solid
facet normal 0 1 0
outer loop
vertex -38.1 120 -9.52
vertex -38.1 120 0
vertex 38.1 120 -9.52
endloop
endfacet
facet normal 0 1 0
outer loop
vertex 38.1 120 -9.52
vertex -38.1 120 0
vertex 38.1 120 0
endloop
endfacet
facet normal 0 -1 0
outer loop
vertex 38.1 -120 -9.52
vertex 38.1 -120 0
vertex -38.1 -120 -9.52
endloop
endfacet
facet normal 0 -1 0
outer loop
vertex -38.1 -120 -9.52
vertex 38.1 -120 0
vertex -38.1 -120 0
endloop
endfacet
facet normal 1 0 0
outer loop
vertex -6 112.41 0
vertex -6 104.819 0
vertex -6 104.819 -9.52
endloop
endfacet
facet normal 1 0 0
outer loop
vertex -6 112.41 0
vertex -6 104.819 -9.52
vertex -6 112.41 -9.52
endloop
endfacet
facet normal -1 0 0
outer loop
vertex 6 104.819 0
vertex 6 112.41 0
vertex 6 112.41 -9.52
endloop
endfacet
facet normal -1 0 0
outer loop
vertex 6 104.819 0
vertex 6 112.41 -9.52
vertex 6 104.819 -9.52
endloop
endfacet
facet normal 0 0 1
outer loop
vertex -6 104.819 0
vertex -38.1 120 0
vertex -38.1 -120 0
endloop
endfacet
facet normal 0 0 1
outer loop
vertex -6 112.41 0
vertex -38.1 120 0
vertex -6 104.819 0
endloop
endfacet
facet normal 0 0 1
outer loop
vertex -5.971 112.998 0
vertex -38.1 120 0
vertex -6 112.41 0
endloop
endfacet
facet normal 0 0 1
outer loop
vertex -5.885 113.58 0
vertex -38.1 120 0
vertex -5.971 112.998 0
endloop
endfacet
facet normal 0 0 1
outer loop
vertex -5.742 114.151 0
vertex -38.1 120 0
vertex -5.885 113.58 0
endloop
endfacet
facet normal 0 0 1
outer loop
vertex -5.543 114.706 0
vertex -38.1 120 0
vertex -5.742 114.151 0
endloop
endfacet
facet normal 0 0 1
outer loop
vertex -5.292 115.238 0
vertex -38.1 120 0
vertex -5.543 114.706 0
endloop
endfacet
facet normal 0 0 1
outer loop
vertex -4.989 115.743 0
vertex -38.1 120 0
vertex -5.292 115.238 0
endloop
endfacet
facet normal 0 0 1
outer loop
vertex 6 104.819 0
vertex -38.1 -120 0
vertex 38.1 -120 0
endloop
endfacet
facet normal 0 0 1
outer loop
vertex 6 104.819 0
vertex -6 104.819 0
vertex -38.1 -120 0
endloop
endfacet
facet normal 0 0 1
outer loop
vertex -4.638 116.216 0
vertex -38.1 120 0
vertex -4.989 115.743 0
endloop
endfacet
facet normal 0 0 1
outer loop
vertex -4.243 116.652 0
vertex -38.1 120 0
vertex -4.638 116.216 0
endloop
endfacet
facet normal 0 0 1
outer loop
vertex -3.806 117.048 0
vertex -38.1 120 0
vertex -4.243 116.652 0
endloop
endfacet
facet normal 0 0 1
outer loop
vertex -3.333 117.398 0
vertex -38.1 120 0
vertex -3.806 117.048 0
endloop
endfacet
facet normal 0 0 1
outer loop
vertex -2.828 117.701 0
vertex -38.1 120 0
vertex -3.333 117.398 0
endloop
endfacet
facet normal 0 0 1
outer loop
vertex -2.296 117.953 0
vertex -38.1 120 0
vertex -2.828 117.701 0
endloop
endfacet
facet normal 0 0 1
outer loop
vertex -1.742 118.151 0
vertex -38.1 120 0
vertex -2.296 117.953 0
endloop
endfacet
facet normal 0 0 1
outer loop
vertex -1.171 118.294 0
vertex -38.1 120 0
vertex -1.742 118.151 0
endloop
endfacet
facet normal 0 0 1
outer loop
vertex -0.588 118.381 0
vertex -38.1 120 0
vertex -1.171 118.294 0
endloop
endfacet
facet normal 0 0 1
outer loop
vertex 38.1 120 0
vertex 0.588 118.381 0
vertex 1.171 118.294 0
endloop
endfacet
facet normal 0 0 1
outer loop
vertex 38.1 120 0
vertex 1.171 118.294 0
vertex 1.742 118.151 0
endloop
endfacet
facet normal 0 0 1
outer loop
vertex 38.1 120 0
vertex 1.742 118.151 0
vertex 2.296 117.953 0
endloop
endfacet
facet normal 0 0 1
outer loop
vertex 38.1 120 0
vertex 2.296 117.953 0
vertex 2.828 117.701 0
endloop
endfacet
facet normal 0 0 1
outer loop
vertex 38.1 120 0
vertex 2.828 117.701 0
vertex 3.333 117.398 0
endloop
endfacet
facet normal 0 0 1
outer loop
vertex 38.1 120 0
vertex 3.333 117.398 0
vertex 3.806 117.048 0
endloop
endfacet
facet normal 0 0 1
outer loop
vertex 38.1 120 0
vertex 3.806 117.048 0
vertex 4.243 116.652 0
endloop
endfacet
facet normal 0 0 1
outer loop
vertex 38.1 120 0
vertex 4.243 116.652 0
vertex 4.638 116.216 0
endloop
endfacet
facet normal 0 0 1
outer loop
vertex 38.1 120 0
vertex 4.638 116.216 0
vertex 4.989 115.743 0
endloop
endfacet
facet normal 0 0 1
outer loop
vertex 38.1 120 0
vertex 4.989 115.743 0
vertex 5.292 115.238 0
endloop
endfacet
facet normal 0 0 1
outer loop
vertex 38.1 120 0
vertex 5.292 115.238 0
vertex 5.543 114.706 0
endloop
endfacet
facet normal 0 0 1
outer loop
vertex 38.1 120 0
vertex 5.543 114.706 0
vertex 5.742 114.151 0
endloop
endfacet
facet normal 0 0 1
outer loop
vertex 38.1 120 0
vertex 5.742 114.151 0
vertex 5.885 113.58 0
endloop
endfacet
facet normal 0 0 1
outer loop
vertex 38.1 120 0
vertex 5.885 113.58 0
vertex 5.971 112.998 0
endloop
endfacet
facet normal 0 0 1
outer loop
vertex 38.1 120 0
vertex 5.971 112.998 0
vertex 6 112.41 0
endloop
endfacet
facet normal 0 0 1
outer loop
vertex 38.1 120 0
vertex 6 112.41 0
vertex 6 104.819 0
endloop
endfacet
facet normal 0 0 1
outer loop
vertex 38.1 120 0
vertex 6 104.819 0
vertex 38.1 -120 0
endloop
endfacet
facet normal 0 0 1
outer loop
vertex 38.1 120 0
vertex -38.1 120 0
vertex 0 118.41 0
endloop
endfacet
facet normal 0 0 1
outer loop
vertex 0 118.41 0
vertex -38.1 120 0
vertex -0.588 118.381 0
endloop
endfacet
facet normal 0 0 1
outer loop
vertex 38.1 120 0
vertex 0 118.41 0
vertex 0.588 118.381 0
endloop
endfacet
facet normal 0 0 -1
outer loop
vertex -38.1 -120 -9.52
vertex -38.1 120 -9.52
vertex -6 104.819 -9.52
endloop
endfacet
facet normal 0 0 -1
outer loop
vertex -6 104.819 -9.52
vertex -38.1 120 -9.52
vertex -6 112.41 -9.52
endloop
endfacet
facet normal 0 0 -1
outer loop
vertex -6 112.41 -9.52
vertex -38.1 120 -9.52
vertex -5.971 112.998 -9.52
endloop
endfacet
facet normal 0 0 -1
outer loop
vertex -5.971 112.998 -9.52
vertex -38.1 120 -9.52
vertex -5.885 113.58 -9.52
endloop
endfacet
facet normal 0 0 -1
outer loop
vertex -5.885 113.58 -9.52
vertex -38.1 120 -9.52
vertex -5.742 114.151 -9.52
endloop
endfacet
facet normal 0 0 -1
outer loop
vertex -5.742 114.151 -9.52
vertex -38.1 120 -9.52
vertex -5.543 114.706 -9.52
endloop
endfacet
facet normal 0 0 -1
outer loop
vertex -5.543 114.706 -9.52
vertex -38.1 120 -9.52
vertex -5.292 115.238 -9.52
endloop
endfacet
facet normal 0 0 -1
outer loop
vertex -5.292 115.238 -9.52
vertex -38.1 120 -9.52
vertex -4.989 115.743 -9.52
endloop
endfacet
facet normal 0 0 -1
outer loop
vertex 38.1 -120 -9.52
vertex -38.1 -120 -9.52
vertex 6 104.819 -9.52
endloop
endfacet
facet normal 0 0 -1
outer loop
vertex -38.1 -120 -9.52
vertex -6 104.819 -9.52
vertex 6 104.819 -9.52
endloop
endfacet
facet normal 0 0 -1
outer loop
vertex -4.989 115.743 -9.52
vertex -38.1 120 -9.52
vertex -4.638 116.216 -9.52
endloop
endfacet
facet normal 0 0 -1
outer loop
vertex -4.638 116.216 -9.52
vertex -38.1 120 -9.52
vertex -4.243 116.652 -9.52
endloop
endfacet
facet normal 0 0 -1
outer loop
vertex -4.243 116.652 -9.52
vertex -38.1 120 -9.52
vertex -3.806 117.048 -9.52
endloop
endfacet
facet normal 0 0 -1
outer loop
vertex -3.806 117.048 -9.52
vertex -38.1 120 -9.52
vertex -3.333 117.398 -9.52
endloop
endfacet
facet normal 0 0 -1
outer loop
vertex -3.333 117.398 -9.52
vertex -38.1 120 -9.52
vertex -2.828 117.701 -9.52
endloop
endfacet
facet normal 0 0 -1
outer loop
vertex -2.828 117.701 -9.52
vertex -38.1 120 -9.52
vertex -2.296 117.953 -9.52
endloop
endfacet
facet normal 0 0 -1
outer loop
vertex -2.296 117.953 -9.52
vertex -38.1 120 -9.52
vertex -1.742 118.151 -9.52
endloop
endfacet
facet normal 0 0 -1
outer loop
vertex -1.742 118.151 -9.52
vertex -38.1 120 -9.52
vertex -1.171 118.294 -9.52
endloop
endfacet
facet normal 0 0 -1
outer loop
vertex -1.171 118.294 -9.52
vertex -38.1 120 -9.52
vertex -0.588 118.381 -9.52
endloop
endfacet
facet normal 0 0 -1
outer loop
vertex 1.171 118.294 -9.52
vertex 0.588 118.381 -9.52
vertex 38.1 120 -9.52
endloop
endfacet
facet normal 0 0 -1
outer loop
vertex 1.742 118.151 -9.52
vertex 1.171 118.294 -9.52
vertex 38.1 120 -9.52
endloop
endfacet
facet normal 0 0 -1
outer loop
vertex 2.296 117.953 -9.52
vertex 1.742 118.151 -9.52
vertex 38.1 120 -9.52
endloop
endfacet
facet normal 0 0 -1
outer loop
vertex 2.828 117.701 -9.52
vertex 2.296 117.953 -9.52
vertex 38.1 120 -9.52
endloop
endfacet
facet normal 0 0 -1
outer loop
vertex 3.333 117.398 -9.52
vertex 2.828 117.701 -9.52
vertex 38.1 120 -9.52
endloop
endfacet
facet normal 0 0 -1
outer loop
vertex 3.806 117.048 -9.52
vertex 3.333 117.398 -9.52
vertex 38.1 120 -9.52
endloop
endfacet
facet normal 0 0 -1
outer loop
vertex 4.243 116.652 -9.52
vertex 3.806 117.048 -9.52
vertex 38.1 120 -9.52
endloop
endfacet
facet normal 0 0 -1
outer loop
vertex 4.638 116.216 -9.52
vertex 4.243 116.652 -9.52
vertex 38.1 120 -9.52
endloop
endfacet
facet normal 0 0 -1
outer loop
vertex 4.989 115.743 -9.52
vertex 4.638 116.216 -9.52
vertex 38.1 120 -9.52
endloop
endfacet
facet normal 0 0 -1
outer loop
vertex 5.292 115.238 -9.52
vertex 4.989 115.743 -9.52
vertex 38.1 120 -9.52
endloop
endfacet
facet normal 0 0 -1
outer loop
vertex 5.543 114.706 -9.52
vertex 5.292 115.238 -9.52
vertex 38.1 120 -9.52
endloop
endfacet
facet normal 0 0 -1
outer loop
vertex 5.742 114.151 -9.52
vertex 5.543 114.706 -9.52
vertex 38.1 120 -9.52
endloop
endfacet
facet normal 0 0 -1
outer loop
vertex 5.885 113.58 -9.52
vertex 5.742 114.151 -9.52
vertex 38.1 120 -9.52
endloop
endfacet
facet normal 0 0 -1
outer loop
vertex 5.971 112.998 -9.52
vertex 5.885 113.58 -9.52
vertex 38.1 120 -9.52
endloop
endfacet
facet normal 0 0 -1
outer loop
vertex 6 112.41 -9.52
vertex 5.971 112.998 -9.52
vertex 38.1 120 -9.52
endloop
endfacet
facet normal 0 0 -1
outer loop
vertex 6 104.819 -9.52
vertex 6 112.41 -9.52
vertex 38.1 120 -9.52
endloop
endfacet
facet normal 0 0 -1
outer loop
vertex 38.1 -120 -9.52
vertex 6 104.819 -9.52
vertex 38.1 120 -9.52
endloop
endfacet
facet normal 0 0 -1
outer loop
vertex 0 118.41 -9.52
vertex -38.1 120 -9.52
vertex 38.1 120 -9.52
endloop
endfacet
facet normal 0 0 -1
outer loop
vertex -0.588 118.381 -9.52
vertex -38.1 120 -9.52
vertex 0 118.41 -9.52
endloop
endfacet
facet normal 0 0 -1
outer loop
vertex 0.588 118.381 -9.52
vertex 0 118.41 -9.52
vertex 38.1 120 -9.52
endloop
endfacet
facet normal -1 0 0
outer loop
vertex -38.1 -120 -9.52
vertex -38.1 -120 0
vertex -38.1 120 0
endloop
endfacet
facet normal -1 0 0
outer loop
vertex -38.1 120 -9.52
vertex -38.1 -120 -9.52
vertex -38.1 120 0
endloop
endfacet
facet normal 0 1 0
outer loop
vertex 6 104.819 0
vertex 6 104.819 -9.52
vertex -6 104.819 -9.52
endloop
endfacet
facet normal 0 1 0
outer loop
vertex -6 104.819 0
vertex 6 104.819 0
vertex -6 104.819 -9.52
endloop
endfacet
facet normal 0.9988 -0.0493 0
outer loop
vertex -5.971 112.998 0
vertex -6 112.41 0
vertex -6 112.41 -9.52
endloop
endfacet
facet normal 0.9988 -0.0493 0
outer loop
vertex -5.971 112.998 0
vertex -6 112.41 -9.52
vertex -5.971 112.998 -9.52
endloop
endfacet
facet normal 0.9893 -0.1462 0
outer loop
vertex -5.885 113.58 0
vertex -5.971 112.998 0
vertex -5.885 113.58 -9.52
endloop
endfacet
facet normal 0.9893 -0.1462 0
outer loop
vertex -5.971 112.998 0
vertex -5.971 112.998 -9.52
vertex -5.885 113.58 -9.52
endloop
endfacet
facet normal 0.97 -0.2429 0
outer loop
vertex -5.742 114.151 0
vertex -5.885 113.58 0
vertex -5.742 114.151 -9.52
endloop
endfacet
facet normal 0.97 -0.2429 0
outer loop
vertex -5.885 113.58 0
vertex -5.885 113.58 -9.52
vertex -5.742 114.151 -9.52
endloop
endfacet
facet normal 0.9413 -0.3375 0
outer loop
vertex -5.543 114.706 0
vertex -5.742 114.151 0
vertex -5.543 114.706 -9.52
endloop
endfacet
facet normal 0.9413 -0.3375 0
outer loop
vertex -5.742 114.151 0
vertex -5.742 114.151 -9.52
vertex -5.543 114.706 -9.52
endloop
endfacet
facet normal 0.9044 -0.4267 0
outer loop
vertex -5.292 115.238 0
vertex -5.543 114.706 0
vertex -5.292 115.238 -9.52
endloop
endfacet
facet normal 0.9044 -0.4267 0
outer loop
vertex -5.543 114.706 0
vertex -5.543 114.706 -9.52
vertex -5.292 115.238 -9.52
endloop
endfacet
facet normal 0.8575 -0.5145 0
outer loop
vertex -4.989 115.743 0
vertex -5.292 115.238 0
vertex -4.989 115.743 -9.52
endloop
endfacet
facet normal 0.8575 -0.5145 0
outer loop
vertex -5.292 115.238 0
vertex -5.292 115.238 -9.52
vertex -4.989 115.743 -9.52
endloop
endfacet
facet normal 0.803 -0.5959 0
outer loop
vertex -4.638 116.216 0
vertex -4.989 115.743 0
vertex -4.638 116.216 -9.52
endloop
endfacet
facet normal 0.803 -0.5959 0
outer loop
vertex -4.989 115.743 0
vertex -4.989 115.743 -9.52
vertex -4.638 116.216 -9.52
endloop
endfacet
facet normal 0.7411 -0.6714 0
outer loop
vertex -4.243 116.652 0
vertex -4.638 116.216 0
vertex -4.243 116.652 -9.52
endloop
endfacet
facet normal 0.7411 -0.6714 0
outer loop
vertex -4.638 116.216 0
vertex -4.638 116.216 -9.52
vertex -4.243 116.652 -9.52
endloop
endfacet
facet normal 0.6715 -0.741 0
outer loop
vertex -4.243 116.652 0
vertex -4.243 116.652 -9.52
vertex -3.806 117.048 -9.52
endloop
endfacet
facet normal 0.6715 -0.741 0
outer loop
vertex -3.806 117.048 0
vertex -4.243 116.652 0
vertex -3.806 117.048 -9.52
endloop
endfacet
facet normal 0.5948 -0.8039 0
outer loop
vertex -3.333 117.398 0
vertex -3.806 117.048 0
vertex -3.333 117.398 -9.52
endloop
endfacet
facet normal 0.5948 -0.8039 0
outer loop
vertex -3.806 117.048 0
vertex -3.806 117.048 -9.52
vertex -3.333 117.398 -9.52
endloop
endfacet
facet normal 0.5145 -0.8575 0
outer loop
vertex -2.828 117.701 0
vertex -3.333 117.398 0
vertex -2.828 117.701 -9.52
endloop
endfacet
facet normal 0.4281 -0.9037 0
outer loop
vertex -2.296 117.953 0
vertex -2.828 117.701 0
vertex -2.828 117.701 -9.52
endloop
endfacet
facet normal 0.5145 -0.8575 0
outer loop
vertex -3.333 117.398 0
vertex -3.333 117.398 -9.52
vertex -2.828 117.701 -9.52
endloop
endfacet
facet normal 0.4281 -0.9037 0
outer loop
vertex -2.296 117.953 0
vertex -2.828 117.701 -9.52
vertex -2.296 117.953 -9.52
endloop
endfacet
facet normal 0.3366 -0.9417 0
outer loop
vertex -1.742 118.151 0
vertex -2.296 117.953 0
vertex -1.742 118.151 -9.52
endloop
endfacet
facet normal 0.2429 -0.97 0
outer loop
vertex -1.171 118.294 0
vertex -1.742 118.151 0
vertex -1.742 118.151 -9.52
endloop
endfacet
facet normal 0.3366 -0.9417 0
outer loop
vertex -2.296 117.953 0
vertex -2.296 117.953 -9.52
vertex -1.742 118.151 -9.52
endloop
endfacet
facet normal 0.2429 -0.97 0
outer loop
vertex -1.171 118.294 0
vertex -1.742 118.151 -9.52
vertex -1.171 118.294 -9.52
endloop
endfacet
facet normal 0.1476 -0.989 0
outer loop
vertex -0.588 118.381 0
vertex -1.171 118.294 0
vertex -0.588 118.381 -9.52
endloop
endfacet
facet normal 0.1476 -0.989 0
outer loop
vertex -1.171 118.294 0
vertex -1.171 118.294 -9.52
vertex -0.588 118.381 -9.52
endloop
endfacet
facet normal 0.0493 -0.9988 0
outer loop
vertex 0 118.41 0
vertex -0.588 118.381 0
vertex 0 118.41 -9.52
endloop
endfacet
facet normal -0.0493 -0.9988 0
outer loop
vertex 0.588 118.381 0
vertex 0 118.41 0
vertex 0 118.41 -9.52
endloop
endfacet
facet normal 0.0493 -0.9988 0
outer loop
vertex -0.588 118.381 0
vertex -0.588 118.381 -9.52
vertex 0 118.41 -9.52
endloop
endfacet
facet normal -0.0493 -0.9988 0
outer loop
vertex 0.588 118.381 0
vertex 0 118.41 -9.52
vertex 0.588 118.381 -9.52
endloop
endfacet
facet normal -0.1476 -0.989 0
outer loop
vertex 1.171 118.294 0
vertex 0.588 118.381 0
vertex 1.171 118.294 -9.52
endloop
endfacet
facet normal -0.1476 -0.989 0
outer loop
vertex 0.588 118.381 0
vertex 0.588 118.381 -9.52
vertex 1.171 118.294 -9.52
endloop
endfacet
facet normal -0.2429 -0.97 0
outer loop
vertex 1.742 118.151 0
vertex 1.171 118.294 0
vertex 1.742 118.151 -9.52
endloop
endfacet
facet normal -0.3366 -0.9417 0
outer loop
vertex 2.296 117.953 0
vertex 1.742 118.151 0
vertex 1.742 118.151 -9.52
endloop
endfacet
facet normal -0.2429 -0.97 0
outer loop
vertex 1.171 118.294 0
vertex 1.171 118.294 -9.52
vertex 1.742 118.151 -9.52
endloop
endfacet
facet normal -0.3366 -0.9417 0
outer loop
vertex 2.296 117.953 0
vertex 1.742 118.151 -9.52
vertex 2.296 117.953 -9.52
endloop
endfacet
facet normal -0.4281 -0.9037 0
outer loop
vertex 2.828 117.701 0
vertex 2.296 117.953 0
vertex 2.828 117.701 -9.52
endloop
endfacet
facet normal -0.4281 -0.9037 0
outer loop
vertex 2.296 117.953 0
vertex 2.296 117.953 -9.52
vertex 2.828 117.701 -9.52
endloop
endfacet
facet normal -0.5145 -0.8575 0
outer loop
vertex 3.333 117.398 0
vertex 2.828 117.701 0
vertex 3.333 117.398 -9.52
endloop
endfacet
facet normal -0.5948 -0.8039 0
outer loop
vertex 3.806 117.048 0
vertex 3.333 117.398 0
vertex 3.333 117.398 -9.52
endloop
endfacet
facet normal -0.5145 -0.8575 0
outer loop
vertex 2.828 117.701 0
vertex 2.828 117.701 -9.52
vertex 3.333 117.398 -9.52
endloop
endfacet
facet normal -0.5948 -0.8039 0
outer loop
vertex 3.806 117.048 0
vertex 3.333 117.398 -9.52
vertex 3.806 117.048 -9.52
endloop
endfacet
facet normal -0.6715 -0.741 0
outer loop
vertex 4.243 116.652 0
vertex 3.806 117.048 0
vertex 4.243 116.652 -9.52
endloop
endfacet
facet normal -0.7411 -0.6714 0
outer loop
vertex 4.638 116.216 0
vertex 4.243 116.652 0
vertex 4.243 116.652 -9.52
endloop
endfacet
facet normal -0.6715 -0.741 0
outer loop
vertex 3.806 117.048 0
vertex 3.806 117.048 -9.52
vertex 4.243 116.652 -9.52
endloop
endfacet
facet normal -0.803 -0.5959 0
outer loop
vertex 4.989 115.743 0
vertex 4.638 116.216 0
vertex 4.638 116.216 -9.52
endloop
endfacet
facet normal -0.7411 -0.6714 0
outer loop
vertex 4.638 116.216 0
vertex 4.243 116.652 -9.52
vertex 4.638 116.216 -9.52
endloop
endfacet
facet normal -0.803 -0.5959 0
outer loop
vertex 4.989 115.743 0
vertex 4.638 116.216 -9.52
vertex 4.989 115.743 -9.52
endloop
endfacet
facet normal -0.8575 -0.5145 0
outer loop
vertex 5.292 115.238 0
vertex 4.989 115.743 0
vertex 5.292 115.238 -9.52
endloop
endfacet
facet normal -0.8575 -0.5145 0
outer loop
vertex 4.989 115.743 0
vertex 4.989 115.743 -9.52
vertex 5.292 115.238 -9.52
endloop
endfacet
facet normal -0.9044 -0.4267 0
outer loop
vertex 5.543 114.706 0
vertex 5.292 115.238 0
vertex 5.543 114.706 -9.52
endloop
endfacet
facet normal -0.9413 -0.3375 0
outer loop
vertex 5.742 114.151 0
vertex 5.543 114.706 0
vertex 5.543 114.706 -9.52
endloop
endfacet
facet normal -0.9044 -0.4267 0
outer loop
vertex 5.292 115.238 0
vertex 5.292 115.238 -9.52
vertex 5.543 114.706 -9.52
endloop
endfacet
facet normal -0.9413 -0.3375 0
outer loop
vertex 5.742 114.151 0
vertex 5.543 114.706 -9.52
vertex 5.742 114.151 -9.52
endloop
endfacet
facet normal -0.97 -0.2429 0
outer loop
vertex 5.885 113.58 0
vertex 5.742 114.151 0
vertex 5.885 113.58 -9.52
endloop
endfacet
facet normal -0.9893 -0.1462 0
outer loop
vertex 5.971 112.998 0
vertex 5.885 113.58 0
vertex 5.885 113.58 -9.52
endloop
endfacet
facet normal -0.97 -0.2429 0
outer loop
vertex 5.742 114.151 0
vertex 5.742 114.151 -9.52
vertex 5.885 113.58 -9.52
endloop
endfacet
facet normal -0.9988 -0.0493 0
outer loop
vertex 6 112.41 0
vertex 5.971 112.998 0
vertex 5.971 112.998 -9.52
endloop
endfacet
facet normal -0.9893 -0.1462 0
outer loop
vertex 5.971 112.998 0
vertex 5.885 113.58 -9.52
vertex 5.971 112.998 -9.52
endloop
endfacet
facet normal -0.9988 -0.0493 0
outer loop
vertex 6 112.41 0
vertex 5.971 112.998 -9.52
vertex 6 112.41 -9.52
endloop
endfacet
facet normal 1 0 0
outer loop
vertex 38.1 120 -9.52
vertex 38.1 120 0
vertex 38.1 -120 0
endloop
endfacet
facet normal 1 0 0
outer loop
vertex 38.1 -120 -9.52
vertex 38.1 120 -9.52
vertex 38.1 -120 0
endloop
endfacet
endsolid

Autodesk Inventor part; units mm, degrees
ref_plane "YZ Plane" through (0, 0, 0) normal (1, 0, 0) x (0, 1, 0)
ref_plane "XZ Plane" through (0, 0, 0) normal (0, 1, 0) x (-1, 0, 0)
ref_plane "XY Plane" through (0, 0, 0) normal (0, 0, 1) x (1, 0, 0)
sketch "Esboço2" plane through (0, 0, 0) normal (0, 0, 1) x (1, 0, 0)
  line L0 (-38.1, 120) -> (38.1, 120)
  line L1 (38.1, 120) -> (38.1, -120)
  line L2 (38.1, -120) -> (-38.1, -120)
  line L3 (-38.1, -120) -> (-38.1, 120)
  line L4 (-38.1, 120) -> (38.1, -120) construction
  line L5 (38.1, 120) -> (-38.1, -120) construction
  point P0 (0, 0)
  dimension "d6" = 76.2
  dimension "d7" = 240
extrude "Extrusão2" add sketch "Esboço2" against normal blind 9.52
sketch "Esboço3" plane through (0, 0, -9.52) normal (0, 0, -1) x (-1, 0, 0)
  line L0 (0, 120) -> (0, 104.8191) construction
  line L1 (0, 104.8191) -> (-38.1, 104.8191) construction
  line L2 (-38.1, 120) -> (-38.1, -120) projected
  line L3 (0, 104.8191) -> (38.1, 104.8191) construction
  line L4 (38.1, -120) -> (38.1, 120) projected
  arc A0 (6, 112.4095) -> (-6, 112.4095) centre (0, 112.4095) ccw
  line L5 (-6, 112.4095) -> (-6, 104.8191)
  line L6 (6, 104.8191) -> (6, 112.4095)
  line L7 (-6, 104.8191) -> (6, 104.8191)
  point P0 (0, 0)
  dimension "d10" = 12
extrude "Extrusão3" cut sketch "Esboço3" against normal through all
properties part number "base_fixaxao_cabeca_supeior"
